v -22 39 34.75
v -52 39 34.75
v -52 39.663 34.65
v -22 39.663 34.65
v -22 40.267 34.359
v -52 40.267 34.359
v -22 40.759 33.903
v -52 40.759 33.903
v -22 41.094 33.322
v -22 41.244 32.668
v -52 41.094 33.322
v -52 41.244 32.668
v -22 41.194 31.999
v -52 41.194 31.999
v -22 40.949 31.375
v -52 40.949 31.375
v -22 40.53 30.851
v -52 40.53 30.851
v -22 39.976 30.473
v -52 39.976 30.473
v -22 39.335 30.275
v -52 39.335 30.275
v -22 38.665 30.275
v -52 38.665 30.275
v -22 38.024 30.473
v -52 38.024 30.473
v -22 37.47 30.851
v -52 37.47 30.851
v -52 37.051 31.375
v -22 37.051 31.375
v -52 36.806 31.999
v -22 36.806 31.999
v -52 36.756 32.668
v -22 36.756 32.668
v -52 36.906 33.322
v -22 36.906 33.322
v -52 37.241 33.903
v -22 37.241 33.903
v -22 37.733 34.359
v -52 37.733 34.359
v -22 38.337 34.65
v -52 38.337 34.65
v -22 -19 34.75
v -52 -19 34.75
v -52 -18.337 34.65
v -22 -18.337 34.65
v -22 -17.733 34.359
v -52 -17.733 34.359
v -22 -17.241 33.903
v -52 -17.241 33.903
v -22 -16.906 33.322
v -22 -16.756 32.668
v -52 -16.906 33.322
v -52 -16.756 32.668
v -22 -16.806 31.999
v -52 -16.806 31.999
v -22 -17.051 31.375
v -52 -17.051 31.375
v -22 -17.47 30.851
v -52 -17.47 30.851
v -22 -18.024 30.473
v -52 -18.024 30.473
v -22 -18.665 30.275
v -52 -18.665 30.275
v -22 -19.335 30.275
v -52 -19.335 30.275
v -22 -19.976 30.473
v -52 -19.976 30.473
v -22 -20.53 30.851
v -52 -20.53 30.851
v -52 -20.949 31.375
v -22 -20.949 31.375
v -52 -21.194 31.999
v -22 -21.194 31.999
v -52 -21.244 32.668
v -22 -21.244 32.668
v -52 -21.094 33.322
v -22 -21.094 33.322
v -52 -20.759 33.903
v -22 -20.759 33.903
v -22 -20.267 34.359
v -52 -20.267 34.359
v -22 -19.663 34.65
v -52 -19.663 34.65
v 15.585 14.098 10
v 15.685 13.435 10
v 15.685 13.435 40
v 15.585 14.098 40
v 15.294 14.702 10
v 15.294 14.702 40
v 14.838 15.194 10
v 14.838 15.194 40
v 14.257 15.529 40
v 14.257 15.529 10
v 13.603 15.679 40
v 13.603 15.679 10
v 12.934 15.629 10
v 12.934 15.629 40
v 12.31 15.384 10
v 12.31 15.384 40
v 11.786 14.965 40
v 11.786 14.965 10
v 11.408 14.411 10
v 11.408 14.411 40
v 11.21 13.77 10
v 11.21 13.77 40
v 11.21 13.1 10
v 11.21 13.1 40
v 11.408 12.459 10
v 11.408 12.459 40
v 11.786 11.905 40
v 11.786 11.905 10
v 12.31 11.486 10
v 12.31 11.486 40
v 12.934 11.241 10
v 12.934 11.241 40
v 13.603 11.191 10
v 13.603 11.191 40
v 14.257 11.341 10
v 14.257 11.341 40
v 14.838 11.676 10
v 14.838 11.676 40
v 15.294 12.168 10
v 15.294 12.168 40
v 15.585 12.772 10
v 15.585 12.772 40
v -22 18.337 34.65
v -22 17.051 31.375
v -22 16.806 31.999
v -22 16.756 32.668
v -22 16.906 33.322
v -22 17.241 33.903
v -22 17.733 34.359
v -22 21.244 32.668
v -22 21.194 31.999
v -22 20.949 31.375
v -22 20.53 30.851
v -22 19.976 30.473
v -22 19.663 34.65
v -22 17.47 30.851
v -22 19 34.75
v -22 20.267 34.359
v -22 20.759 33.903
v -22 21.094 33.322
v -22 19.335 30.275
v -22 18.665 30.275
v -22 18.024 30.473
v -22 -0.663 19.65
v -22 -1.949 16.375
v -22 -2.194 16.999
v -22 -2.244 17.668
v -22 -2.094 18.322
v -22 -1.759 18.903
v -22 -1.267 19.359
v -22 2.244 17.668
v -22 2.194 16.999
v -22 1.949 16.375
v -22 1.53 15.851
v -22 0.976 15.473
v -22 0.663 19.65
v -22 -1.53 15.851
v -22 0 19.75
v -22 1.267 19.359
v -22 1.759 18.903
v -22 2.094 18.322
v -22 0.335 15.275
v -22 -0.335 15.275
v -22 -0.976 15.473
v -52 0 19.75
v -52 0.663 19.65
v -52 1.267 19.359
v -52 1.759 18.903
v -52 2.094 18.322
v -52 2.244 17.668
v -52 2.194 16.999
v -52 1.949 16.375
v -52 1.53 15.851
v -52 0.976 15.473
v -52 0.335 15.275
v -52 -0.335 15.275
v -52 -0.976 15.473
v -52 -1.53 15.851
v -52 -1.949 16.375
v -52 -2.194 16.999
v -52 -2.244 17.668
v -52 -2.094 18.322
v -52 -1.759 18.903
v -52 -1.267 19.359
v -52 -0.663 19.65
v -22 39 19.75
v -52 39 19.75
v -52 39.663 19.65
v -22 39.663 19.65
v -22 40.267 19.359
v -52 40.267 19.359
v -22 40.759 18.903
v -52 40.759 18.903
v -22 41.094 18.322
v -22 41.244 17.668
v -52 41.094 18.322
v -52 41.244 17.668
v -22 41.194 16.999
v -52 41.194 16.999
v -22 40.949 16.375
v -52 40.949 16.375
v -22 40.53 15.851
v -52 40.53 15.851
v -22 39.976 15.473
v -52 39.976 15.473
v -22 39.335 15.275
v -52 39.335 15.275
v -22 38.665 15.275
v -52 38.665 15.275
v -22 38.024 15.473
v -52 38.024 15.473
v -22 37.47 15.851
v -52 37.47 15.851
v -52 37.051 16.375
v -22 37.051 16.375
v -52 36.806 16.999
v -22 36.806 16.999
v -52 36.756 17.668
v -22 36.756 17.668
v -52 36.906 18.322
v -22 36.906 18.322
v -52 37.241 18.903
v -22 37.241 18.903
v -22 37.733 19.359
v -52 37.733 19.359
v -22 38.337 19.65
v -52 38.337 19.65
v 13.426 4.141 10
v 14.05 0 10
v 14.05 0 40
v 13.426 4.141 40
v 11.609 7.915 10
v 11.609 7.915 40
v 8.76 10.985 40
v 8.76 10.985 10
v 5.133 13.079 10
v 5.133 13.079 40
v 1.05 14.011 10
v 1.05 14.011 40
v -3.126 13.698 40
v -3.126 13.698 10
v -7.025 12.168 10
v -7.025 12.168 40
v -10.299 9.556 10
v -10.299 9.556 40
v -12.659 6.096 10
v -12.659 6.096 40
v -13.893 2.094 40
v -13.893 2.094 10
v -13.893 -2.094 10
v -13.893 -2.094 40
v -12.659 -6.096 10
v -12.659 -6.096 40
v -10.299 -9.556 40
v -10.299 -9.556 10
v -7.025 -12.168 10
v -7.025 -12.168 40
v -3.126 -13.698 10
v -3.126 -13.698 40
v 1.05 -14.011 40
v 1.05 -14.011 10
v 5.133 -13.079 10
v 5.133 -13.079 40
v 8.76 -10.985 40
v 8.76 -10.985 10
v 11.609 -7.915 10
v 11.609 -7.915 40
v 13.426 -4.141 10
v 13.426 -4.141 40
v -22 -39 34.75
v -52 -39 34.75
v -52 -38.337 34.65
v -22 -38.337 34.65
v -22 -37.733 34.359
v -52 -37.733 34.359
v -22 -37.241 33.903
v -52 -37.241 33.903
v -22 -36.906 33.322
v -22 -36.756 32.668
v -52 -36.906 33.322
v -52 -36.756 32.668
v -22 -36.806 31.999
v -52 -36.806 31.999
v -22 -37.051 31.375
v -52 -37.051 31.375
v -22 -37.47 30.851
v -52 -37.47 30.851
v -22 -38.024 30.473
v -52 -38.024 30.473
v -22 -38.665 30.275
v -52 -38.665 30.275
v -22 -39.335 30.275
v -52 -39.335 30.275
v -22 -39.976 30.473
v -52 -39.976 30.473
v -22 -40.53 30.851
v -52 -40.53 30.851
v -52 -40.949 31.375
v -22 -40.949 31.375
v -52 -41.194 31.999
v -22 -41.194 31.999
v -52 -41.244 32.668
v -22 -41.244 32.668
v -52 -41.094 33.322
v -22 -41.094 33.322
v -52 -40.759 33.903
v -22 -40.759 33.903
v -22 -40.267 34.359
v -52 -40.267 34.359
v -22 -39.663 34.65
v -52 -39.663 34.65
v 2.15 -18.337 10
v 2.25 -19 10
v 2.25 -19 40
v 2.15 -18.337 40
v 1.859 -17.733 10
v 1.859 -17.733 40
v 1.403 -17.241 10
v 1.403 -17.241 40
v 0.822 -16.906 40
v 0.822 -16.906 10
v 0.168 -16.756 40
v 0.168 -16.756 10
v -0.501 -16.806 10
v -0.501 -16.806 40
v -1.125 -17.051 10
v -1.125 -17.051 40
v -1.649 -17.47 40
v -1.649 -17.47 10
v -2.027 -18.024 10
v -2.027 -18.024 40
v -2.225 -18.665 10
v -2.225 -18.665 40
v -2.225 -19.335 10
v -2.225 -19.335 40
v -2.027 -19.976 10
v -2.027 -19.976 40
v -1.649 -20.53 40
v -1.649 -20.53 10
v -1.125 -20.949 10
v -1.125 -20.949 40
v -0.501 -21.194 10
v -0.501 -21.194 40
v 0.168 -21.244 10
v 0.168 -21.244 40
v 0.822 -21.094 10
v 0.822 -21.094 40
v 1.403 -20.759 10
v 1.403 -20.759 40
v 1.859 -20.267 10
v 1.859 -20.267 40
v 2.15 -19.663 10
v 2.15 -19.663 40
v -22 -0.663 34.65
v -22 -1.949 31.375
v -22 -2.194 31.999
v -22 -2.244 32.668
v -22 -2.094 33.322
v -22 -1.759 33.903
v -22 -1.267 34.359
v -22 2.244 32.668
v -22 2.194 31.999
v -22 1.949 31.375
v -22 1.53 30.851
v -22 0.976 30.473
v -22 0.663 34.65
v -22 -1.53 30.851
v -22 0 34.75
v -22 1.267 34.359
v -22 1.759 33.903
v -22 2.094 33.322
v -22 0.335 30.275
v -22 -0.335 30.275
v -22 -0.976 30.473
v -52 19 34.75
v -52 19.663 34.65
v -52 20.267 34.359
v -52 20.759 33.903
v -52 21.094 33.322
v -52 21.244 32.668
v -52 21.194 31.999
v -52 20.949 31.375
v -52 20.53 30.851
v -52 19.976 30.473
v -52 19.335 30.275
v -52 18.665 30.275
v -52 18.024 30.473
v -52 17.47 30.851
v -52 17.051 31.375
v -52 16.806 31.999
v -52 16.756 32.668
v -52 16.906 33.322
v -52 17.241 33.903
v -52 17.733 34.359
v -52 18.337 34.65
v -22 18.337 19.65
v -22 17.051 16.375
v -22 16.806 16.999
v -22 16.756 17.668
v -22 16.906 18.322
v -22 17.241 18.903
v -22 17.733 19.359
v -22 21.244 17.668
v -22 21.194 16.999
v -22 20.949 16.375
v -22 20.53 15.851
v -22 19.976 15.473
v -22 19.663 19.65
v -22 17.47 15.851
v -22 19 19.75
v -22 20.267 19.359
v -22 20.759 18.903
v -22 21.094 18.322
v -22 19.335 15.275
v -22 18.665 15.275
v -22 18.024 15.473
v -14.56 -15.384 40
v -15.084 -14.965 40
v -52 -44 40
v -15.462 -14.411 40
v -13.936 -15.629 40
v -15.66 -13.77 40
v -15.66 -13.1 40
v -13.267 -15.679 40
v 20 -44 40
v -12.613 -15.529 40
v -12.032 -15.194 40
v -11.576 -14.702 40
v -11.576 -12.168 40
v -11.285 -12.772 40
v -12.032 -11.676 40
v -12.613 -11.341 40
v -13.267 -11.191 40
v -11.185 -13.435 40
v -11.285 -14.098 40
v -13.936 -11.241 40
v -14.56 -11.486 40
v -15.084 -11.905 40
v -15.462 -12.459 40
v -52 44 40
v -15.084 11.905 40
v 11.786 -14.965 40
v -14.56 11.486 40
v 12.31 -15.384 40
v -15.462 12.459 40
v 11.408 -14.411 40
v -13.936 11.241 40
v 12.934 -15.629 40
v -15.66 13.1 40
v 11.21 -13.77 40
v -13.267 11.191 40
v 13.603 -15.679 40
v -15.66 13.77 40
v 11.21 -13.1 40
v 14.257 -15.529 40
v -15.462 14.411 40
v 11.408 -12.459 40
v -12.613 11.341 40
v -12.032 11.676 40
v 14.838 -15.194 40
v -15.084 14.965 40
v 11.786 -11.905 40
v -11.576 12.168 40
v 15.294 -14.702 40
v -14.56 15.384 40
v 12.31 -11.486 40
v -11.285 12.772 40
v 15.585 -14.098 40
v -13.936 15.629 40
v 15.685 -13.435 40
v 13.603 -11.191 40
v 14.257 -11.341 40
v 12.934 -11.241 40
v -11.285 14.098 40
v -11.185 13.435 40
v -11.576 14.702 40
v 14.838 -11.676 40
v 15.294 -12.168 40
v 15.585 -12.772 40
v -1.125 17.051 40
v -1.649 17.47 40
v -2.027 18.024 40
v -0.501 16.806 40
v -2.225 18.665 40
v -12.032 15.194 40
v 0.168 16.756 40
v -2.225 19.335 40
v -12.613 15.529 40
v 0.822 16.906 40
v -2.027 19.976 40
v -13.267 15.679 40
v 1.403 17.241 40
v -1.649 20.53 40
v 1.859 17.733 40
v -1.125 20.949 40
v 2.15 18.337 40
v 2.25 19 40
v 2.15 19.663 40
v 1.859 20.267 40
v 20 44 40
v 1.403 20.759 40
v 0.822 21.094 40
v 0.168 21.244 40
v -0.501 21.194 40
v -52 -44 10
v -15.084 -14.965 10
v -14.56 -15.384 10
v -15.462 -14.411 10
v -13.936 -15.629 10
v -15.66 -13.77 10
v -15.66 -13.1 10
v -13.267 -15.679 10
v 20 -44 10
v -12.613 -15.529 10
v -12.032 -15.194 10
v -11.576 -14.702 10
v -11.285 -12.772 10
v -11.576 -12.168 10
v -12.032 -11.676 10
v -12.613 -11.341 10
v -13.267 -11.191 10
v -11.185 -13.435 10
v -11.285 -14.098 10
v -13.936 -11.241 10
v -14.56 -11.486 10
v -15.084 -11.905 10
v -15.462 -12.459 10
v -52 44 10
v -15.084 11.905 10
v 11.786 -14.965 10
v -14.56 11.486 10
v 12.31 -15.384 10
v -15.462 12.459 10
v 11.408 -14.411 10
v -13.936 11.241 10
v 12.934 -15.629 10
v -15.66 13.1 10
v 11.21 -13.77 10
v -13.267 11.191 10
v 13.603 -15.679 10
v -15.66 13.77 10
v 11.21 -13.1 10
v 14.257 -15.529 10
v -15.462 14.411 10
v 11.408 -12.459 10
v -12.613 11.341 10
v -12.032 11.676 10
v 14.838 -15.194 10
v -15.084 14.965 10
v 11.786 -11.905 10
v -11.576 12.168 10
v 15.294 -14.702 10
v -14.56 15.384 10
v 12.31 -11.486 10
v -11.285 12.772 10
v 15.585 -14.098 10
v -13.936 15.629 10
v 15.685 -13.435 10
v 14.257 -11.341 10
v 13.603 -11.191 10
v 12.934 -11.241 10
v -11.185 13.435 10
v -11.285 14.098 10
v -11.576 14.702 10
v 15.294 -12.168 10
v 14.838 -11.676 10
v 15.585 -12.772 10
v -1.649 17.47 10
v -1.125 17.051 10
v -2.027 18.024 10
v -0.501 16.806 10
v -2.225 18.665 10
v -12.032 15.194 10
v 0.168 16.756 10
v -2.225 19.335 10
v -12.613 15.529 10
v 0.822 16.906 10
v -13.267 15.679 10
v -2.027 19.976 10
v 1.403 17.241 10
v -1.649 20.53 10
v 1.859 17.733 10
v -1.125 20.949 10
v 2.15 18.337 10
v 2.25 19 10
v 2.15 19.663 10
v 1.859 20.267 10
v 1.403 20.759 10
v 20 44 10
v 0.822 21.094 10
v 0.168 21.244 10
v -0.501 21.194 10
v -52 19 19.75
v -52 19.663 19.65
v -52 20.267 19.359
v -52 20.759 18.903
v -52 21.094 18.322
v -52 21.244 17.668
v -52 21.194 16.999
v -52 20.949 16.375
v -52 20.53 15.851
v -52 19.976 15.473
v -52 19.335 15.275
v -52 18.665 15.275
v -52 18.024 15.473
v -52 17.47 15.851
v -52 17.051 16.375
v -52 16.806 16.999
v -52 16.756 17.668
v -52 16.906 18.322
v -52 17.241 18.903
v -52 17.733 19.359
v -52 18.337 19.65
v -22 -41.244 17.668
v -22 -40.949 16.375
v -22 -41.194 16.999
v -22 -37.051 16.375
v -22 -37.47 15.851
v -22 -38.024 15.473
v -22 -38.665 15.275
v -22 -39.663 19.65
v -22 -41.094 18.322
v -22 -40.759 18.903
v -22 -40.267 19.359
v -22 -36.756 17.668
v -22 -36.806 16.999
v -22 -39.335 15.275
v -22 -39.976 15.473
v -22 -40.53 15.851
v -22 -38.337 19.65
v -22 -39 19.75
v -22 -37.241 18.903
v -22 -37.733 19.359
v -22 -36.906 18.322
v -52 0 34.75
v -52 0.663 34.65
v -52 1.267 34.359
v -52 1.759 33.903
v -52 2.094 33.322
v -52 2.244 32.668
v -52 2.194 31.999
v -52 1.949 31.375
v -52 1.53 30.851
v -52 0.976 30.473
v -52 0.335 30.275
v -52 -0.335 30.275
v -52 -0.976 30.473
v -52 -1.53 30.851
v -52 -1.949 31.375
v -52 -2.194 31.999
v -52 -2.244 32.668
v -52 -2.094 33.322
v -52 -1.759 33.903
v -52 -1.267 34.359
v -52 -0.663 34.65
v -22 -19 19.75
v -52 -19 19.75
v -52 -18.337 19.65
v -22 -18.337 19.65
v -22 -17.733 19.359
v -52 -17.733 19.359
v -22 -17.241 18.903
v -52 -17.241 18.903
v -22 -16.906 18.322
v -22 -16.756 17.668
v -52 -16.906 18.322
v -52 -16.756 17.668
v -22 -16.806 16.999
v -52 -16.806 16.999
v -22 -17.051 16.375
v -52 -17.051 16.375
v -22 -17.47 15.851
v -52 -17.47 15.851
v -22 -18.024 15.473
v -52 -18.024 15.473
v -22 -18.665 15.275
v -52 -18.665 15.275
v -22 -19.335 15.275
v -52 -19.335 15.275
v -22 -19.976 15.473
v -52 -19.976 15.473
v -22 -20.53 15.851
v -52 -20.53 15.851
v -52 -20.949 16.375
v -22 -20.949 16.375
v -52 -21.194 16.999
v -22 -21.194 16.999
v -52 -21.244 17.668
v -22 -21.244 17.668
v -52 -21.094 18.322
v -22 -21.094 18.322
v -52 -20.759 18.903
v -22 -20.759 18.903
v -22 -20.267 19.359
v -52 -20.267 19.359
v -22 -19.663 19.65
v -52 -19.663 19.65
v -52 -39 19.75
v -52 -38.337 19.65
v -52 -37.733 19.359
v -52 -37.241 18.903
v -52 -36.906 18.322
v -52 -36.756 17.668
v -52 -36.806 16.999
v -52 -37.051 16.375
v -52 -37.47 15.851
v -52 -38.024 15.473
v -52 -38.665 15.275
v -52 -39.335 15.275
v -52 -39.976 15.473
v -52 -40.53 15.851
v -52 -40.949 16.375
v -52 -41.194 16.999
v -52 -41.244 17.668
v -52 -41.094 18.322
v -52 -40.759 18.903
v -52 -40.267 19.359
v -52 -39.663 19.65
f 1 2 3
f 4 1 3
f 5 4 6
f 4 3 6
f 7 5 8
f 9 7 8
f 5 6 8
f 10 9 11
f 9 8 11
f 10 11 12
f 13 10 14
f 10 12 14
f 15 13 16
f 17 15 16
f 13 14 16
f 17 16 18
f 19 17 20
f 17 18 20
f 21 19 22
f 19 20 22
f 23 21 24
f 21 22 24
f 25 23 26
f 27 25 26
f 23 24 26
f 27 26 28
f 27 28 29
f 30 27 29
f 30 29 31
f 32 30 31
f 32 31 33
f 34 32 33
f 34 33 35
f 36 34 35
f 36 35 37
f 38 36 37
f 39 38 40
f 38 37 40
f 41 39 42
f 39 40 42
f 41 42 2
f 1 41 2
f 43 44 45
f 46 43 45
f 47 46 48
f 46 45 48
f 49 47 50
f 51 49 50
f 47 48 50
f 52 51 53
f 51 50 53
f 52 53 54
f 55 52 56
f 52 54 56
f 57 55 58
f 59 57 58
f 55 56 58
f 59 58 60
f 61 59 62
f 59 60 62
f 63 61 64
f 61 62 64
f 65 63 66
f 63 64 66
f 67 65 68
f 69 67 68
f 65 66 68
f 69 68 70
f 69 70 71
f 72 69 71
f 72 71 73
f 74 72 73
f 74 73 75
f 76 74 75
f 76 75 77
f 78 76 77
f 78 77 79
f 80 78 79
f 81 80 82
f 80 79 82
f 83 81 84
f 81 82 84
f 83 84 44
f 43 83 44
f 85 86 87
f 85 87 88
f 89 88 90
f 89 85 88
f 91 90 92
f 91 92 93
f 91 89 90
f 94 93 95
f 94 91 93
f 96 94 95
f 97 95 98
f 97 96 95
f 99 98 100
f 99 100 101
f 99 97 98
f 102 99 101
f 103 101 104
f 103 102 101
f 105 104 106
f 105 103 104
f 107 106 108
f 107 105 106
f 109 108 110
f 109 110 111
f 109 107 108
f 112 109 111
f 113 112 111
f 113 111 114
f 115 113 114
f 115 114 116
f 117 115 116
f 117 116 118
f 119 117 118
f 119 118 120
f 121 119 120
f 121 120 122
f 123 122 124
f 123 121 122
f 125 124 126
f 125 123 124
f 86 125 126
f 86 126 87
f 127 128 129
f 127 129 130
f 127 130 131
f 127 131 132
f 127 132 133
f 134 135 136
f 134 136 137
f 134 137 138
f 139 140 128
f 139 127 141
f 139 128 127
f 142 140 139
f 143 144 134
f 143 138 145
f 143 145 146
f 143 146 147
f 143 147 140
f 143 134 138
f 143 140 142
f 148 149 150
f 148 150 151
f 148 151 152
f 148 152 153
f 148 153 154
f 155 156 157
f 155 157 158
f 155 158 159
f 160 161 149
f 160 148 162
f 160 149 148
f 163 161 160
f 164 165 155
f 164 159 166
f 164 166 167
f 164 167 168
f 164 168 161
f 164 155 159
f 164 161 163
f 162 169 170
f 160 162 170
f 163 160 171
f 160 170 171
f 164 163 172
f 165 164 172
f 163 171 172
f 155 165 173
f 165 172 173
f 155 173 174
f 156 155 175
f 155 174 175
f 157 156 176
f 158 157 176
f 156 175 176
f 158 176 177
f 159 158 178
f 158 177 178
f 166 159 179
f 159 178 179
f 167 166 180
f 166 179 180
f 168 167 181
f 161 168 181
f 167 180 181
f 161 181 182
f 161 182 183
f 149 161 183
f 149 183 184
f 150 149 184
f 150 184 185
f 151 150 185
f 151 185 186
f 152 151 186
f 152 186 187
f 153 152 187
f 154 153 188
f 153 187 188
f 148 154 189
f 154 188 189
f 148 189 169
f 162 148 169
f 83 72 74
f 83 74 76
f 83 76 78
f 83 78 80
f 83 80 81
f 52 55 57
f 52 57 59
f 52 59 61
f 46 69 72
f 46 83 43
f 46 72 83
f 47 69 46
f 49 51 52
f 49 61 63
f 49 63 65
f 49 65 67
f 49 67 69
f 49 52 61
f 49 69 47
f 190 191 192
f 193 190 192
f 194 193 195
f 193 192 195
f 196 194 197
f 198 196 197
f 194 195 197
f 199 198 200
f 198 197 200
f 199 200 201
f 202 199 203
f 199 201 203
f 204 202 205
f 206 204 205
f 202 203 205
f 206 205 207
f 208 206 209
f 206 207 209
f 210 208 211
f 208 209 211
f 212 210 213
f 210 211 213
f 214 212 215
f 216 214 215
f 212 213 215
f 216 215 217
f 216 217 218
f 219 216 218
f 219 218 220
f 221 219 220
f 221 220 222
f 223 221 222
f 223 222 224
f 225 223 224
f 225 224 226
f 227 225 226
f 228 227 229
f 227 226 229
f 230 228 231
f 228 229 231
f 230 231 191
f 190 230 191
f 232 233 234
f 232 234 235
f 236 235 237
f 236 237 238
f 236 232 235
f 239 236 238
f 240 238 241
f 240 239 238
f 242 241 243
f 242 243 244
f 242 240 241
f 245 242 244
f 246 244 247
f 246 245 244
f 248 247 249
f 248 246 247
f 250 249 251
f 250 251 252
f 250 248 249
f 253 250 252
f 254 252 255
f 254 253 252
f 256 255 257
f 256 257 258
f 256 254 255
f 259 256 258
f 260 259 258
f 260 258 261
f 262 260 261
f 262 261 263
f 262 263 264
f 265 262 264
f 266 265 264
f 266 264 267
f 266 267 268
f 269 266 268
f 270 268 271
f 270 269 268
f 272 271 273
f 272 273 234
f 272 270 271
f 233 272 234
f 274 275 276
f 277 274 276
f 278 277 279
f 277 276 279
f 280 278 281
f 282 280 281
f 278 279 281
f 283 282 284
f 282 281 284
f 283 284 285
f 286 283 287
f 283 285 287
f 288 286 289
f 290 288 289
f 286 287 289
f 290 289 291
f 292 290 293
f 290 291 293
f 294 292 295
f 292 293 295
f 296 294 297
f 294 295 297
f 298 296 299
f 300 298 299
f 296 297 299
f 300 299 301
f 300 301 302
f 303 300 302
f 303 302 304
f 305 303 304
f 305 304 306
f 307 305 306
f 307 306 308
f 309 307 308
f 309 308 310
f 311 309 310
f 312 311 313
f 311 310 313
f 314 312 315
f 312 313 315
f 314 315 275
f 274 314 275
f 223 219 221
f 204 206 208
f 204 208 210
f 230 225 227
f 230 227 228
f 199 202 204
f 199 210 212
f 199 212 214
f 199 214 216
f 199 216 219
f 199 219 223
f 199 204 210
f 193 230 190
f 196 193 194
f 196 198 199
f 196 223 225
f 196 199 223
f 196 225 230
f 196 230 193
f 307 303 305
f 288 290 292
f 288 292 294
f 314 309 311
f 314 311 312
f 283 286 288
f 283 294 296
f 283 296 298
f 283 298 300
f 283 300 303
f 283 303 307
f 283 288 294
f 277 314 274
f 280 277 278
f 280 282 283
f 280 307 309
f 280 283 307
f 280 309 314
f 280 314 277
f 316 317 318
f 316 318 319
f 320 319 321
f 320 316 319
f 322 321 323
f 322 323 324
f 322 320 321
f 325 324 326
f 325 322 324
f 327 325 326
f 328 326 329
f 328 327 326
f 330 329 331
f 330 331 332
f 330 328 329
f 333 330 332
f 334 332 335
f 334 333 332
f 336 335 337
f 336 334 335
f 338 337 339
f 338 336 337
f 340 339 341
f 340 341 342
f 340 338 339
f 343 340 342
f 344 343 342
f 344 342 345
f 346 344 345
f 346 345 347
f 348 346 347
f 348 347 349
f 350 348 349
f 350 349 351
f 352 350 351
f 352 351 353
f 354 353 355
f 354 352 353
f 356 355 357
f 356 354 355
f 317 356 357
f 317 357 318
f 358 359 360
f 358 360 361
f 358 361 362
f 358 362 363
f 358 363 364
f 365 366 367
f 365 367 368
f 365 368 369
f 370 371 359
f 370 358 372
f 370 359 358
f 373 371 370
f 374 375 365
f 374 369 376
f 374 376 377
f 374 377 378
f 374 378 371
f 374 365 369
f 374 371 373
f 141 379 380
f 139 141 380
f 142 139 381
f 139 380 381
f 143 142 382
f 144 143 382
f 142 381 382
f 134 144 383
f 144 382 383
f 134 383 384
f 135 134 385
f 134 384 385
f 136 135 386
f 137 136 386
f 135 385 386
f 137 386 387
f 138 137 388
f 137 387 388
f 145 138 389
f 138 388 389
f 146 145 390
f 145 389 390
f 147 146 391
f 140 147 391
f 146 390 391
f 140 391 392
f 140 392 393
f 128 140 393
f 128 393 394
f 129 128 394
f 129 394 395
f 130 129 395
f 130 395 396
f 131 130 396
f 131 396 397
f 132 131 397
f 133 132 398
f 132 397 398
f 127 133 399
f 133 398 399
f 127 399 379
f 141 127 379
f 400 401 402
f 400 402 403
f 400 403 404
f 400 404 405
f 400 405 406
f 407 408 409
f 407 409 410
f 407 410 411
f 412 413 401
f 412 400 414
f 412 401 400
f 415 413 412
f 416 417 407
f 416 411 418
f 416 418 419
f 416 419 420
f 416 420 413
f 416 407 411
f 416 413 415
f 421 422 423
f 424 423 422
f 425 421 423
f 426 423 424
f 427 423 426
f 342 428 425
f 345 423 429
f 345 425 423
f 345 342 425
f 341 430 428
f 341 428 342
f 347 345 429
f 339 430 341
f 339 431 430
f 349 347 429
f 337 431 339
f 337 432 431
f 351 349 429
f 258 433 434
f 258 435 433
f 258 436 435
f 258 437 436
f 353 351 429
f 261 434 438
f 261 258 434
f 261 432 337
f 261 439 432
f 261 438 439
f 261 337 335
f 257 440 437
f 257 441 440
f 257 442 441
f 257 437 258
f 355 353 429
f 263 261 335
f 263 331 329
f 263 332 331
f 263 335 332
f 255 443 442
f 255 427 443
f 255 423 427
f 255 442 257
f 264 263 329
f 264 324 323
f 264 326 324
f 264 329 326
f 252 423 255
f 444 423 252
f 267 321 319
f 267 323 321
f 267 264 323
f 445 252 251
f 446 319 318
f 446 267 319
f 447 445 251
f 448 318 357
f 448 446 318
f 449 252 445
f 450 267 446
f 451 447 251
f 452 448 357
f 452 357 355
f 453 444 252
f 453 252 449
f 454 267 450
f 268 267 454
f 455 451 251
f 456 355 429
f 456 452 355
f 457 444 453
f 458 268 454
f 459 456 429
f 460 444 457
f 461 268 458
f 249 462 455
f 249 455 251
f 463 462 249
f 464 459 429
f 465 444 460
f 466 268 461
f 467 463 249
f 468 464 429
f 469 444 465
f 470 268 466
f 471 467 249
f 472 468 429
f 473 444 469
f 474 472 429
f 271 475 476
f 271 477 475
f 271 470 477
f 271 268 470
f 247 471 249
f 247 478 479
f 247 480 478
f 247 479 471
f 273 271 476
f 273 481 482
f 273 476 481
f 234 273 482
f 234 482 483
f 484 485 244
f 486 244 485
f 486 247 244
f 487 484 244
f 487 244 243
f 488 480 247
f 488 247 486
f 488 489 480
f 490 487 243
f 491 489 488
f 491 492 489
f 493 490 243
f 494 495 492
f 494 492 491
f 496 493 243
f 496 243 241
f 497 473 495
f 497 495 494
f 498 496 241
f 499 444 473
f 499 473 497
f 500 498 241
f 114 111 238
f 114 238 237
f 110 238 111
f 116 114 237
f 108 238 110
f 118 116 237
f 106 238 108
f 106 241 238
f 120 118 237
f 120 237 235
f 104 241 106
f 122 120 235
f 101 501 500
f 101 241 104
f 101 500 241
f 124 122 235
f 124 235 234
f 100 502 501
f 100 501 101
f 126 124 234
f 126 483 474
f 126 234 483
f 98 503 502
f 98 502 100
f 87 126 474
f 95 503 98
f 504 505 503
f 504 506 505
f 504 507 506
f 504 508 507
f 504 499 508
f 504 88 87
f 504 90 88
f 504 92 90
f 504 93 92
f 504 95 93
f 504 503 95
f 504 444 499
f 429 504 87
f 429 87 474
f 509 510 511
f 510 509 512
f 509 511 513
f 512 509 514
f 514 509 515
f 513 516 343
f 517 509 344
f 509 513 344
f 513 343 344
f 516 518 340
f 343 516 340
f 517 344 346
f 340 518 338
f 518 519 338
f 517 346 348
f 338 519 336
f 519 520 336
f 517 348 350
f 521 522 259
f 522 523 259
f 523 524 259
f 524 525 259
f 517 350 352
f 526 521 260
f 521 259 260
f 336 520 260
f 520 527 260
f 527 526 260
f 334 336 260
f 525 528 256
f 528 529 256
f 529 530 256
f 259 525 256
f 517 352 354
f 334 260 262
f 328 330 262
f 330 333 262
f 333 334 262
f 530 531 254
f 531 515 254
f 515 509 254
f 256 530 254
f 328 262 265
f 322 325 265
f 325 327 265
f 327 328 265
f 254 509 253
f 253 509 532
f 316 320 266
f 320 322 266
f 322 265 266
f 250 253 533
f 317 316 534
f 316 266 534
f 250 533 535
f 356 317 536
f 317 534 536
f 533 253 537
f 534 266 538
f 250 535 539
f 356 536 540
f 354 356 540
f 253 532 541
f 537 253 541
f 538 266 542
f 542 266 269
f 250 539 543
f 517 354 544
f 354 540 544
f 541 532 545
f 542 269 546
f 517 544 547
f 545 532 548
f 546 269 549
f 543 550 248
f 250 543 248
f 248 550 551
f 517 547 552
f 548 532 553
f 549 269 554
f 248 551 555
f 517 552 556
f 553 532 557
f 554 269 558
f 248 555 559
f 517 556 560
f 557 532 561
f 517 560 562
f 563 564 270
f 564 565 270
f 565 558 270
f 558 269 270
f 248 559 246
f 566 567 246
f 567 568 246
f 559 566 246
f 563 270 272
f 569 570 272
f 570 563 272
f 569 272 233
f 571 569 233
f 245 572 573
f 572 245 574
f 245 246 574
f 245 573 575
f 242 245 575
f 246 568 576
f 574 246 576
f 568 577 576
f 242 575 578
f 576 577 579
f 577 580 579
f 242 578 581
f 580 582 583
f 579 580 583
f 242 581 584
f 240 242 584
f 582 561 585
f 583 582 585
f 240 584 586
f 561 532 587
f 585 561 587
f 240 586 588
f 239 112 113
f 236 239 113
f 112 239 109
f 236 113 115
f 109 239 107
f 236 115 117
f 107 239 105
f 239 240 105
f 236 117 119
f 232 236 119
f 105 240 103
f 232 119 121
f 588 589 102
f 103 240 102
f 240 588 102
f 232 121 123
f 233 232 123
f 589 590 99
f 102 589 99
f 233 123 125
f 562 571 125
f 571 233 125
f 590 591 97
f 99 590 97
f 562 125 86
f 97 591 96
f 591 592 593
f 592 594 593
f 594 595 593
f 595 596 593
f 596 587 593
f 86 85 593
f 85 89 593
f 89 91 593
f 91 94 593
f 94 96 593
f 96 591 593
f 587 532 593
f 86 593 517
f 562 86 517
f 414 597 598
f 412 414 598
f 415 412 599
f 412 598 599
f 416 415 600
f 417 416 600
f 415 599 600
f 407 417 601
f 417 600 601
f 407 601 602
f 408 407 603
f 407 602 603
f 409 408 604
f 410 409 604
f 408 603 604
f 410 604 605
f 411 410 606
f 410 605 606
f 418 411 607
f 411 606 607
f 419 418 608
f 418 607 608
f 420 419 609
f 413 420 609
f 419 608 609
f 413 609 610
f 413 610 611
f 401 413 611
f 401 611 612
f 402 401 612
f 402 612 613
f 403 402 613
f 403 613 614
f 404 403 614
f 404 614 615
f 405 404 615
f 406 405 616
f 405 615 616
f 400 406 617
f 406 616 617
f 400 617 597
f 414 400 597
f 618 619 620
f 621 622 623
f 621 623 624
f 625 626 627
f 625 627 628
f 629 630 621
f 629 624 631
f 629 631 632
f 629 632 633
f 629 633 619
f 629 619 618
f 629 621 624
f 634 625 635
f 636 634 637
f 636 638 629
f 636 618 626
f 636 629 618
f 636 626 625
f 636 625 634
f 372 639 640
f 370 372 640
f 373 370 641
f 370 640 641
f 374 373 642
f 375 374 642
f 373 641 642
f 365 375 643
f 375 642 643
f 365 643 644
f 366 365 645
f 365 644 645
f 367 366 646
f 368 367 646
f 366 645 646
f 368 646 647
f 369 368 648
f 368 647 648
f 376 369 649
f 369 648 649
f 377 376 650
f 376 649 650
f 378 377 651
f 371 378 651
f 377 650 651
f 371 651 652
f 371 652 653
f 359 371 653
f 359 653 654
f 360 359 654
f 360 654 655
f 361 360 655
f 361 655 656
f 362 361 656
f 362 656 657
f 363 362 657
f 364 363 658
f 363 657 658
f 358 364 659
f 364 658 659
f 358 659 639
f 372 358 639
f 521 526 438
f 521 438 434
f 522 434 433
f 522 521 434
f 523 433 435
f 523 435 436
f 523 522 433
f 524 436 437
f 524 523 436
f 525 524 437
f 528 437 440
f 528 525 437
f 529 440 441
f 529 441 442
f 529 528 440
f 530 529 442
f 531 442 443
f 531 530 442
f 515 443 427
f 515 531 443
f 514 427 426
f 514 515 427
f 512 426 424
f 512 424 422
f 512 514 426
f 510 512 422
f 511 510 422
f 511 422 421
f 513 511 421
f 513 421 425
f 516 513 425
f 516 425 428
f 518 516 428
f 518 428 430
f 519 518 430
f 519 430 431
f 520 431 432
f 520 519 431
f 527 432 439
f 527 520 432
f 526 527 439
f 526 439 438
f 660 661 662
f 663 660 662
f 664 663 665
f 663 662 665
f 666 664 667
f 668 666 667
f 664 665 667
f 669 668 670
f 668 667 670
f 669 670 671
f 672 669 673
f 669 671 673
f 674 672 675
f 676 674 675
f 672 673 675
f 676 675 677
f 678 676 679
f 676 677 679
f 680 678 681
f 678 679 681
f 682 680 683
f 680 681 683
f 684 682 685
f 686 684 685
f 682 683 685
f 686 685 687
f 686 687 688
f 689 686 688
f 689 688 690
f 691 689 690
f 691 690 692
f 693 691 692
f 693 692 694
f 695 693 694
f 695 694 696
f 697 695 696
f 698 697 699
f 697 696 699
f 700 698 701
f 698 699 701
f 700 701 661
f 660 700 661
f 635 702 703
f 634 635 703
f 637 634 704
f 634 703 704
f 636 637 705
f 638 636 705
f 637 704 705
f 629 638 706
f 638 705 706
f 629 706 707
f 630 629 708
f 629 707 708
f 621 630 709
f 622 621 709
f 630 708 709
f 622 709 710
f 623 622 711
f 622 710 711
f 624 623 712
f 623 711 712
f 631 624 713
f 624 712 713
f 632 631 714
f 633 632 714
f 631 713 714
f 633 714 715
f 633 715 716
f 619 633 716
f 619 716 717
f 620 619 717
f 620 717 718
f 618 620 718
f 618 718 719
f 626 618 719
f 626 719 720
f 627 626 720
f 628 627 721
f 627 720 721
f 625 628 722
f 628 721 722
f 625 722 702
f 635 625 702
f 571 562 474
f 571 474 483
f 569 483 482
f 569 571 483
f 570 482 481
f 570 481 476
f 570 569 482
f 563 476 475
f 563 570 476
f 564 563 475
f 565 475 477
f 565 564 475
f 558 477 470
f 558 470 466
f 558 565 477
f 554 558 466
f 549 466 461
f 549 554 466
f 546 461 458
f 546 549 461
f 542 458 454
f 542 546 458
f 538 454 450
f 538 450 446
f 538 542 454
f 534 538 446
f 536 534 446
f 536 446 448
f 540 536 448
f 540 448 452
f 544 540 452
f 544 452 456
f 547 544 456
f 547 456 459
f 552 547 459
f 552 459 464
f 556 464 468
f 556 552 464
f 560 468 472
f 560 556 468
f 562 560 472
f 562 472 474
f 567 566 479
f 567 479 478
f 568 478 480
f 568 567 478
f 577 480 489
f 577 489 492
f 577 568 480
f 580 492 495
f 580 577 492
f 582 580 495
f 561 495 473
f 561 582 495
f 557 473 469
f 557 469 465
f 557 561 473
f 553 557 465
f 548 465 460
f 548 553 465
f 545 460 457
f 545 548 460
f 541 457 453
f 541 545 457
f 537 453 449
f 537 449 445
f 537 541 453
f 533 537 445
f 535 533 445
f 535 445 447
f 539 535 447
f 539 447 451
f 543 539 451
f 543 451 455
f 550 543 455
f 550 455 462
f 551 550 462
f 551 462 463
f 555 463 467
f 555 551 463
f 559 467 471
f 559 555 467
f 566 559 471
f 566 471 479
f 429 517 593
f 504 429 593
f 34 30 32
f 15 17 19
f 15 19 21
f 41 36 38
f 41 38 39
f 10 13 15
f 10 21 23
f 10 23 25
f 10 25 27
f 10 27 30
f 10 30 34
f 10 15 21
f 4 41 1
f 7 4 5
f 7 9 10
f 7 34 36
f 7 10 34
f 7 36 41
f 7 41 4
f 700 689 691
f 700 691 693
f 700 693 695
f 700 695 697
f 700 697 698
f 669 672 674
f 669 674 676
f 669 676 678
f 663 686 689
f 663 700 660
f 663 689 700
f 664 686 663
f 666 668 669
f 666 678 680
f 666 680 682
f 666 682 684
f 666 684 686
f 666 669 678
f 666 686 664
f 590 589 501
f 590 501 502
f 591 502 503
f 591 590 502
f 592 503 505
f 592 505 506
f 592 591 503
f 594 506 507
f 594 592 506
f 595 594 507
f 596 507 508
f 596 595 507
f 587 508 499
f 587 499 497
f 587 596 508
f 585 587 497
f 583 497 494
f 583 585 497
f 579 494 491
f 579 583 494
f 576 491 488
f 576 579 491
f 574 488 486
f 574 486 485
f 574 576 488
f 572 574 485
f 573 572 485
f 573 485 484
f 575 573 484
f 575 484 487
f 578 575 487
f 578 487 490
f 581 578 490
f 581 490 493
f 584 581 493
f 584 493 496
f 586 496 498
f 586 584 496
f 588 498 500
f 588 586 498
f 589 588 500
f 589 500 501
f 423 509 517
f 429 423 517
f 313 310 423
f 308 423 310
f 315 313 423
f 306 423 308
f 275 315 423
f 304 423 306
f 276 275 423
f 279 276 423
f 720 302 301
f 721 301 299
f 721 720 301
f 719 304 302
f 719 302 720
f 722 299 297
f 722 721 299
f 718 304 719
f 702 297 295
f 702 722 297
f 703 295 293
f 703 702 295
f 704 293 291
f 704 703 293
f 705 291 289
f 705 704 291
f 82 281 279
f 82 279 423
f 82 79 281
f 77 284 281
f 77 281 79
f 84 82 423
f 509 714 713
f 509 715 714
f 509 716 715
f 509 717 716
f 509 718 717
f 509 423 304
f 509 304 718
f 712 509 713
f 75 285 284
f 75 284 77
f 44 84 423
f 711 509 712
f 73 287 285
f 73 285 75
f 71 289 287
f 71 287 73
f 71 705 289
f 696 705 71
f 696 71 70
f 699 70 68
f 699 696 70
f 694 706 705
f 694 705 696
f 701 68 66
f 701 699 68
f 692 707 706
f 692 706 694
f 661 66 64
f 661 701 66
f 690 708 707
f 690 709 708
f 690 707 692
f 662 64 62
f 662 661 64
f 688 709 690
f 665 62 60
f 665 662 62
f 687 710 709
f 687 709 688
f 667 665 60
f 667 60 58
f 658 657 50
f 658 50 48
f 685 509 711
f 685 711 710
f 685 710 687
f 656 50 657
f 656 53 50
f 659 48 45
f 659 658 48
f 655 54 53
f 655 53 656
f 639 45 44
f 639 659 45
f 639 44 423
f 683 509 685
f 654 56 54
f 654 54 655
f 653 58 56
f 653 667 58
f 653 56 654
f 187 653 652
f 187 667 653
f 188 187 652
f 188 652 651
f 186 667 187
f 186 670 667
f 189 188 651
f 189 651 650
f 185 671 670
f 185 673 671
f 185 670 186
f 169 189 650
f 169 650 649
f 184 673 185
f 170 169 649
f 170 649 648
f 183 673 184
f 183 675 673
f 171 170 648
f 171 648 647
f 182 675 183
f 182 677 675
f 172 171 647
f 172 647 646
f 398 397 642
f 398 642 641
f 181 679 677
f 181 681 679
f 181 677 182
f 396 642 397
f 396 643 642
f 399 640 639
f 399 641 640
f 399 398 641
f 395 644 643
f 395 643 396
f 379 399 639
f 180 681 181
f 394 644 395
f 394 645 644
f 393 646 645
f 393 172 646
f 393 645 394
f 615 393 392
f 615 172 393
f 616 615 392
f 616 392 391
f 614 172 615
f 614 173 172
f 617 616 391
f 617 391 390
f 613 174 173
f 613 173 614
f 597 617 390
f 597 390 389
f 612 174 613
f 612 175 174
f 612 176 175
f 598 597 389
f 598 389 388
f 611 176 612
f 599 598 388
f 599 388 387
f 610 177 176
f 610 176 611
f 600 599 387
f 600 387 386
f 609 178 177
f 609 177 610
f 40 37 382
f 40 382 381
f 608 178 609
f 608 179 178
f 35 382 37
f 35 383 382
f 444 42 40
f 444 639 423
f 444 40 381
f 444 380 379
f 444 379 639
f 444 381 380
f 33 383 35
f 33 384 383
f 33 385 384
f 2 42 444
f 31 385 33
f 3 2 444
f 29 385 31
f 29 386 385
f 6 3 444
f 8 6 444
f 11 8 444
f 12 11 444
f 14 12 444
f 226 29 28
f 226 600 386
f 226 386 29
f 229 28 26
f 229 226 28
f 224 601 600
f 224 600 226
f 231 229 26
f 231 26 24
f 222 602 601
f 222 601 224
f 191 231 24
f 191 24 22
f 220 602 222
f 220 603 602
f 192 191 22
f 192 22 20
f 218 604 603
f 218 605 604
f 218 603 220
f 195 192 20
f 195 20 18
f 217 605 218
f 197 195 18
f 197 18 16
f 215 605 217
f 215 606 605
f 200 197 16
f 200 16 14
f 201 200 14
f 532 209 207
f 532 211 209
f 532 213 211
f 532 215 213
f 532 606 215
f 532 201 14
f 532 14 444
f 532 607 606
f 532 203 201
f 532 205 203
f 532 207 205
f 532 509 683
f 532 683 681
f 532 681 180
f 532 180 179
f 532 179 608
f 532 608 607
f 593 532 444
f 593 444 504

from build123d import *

# Parameters (mm, degrees)
EXTRUDE7_START     = 10
SKETCH1_W          = 72
SKETCH1_H          = 88
SKETCH1_R          = 14.05
SKETCH1_R_2        = 2.25
EXTRUDE7_DEPTH     = 30
SKETCH7_R          = 2.25
CUT_EXTRUDE5_DEPTH = 30


with BuildPart() as part:
    # Sketch1 → Extrude7 (new body)
    with BuildSketch(Plane.XY.offset(EXTRUDE7_START)):
        with Locations((-16, 0)):
            Rectangle(SKETCH1_W, SKETCH1_H)
        Circle(SKETCH1_R, mode=Mode.SUBTRACT)
        with Locations((-13.435028843, 13.435028843)):
            Circle(SKETCH1_R_2, mode=Mode.SUBTRACT)
        with Locations((0, 19)):
            Circle(SKETCH1_R_2, mode=Mode.SUBTRACT)
        with Locations((13.435028843, 13.435028843)):
            Circle(SKETCH1_R_2, mode=Mode.SUBTRACT)
        with Locations((13.435028843, -13.435028843)):
            Circle(SKETCH1_R_2, mode=Mode.SUBTRACT)
        with Locations((0, -19)):
            Circle(SKETCH1_R_2, mode=Mode.SUBTRACT)
        with Locations((-13.435028843, -13.435028843)):
            Circle(SKETCH1_R_2, mode=Mode.SUBTRACT)
    extrude(amount=EXTRUDE7_DEPTH)

    # Sketch7 → Cut-Extrude5 (cut)
    with BuildSketch(Plane.ZY.offset(52)):
        with Locations((17.5, 39)):
            Circle(SKETCH7_R)
        with Locations((17.5, 19)):
            Circle(SKETCH7_R)
        with Locations((17.5, -39)):
            Circle(SKETCH7_R)
        with Locations((17.5, -19)):
            Circle(SKETCH7_R)
        with Locations((17.5, 0)):
            Circle(SKETCH7_R)
        with Locations((32.5, -39)):
            Circle(SKETCH7_R)
        with Locations((32.5, -19)):
            Circle(SKETCH7_R)
        with Locations((32.5, 0)):
            Circle(SKETCH7_R)
        with Locations((32.5, 19)):
            Circle(SKETCH7_R)
        with Locations((32.5, 39)):
            Circle(SKETCH7_R)
    extrude(amount=-CUT_EXTRUDE5_DEPTH, mode=Mode.SUBTRACT)


solid = part.part
